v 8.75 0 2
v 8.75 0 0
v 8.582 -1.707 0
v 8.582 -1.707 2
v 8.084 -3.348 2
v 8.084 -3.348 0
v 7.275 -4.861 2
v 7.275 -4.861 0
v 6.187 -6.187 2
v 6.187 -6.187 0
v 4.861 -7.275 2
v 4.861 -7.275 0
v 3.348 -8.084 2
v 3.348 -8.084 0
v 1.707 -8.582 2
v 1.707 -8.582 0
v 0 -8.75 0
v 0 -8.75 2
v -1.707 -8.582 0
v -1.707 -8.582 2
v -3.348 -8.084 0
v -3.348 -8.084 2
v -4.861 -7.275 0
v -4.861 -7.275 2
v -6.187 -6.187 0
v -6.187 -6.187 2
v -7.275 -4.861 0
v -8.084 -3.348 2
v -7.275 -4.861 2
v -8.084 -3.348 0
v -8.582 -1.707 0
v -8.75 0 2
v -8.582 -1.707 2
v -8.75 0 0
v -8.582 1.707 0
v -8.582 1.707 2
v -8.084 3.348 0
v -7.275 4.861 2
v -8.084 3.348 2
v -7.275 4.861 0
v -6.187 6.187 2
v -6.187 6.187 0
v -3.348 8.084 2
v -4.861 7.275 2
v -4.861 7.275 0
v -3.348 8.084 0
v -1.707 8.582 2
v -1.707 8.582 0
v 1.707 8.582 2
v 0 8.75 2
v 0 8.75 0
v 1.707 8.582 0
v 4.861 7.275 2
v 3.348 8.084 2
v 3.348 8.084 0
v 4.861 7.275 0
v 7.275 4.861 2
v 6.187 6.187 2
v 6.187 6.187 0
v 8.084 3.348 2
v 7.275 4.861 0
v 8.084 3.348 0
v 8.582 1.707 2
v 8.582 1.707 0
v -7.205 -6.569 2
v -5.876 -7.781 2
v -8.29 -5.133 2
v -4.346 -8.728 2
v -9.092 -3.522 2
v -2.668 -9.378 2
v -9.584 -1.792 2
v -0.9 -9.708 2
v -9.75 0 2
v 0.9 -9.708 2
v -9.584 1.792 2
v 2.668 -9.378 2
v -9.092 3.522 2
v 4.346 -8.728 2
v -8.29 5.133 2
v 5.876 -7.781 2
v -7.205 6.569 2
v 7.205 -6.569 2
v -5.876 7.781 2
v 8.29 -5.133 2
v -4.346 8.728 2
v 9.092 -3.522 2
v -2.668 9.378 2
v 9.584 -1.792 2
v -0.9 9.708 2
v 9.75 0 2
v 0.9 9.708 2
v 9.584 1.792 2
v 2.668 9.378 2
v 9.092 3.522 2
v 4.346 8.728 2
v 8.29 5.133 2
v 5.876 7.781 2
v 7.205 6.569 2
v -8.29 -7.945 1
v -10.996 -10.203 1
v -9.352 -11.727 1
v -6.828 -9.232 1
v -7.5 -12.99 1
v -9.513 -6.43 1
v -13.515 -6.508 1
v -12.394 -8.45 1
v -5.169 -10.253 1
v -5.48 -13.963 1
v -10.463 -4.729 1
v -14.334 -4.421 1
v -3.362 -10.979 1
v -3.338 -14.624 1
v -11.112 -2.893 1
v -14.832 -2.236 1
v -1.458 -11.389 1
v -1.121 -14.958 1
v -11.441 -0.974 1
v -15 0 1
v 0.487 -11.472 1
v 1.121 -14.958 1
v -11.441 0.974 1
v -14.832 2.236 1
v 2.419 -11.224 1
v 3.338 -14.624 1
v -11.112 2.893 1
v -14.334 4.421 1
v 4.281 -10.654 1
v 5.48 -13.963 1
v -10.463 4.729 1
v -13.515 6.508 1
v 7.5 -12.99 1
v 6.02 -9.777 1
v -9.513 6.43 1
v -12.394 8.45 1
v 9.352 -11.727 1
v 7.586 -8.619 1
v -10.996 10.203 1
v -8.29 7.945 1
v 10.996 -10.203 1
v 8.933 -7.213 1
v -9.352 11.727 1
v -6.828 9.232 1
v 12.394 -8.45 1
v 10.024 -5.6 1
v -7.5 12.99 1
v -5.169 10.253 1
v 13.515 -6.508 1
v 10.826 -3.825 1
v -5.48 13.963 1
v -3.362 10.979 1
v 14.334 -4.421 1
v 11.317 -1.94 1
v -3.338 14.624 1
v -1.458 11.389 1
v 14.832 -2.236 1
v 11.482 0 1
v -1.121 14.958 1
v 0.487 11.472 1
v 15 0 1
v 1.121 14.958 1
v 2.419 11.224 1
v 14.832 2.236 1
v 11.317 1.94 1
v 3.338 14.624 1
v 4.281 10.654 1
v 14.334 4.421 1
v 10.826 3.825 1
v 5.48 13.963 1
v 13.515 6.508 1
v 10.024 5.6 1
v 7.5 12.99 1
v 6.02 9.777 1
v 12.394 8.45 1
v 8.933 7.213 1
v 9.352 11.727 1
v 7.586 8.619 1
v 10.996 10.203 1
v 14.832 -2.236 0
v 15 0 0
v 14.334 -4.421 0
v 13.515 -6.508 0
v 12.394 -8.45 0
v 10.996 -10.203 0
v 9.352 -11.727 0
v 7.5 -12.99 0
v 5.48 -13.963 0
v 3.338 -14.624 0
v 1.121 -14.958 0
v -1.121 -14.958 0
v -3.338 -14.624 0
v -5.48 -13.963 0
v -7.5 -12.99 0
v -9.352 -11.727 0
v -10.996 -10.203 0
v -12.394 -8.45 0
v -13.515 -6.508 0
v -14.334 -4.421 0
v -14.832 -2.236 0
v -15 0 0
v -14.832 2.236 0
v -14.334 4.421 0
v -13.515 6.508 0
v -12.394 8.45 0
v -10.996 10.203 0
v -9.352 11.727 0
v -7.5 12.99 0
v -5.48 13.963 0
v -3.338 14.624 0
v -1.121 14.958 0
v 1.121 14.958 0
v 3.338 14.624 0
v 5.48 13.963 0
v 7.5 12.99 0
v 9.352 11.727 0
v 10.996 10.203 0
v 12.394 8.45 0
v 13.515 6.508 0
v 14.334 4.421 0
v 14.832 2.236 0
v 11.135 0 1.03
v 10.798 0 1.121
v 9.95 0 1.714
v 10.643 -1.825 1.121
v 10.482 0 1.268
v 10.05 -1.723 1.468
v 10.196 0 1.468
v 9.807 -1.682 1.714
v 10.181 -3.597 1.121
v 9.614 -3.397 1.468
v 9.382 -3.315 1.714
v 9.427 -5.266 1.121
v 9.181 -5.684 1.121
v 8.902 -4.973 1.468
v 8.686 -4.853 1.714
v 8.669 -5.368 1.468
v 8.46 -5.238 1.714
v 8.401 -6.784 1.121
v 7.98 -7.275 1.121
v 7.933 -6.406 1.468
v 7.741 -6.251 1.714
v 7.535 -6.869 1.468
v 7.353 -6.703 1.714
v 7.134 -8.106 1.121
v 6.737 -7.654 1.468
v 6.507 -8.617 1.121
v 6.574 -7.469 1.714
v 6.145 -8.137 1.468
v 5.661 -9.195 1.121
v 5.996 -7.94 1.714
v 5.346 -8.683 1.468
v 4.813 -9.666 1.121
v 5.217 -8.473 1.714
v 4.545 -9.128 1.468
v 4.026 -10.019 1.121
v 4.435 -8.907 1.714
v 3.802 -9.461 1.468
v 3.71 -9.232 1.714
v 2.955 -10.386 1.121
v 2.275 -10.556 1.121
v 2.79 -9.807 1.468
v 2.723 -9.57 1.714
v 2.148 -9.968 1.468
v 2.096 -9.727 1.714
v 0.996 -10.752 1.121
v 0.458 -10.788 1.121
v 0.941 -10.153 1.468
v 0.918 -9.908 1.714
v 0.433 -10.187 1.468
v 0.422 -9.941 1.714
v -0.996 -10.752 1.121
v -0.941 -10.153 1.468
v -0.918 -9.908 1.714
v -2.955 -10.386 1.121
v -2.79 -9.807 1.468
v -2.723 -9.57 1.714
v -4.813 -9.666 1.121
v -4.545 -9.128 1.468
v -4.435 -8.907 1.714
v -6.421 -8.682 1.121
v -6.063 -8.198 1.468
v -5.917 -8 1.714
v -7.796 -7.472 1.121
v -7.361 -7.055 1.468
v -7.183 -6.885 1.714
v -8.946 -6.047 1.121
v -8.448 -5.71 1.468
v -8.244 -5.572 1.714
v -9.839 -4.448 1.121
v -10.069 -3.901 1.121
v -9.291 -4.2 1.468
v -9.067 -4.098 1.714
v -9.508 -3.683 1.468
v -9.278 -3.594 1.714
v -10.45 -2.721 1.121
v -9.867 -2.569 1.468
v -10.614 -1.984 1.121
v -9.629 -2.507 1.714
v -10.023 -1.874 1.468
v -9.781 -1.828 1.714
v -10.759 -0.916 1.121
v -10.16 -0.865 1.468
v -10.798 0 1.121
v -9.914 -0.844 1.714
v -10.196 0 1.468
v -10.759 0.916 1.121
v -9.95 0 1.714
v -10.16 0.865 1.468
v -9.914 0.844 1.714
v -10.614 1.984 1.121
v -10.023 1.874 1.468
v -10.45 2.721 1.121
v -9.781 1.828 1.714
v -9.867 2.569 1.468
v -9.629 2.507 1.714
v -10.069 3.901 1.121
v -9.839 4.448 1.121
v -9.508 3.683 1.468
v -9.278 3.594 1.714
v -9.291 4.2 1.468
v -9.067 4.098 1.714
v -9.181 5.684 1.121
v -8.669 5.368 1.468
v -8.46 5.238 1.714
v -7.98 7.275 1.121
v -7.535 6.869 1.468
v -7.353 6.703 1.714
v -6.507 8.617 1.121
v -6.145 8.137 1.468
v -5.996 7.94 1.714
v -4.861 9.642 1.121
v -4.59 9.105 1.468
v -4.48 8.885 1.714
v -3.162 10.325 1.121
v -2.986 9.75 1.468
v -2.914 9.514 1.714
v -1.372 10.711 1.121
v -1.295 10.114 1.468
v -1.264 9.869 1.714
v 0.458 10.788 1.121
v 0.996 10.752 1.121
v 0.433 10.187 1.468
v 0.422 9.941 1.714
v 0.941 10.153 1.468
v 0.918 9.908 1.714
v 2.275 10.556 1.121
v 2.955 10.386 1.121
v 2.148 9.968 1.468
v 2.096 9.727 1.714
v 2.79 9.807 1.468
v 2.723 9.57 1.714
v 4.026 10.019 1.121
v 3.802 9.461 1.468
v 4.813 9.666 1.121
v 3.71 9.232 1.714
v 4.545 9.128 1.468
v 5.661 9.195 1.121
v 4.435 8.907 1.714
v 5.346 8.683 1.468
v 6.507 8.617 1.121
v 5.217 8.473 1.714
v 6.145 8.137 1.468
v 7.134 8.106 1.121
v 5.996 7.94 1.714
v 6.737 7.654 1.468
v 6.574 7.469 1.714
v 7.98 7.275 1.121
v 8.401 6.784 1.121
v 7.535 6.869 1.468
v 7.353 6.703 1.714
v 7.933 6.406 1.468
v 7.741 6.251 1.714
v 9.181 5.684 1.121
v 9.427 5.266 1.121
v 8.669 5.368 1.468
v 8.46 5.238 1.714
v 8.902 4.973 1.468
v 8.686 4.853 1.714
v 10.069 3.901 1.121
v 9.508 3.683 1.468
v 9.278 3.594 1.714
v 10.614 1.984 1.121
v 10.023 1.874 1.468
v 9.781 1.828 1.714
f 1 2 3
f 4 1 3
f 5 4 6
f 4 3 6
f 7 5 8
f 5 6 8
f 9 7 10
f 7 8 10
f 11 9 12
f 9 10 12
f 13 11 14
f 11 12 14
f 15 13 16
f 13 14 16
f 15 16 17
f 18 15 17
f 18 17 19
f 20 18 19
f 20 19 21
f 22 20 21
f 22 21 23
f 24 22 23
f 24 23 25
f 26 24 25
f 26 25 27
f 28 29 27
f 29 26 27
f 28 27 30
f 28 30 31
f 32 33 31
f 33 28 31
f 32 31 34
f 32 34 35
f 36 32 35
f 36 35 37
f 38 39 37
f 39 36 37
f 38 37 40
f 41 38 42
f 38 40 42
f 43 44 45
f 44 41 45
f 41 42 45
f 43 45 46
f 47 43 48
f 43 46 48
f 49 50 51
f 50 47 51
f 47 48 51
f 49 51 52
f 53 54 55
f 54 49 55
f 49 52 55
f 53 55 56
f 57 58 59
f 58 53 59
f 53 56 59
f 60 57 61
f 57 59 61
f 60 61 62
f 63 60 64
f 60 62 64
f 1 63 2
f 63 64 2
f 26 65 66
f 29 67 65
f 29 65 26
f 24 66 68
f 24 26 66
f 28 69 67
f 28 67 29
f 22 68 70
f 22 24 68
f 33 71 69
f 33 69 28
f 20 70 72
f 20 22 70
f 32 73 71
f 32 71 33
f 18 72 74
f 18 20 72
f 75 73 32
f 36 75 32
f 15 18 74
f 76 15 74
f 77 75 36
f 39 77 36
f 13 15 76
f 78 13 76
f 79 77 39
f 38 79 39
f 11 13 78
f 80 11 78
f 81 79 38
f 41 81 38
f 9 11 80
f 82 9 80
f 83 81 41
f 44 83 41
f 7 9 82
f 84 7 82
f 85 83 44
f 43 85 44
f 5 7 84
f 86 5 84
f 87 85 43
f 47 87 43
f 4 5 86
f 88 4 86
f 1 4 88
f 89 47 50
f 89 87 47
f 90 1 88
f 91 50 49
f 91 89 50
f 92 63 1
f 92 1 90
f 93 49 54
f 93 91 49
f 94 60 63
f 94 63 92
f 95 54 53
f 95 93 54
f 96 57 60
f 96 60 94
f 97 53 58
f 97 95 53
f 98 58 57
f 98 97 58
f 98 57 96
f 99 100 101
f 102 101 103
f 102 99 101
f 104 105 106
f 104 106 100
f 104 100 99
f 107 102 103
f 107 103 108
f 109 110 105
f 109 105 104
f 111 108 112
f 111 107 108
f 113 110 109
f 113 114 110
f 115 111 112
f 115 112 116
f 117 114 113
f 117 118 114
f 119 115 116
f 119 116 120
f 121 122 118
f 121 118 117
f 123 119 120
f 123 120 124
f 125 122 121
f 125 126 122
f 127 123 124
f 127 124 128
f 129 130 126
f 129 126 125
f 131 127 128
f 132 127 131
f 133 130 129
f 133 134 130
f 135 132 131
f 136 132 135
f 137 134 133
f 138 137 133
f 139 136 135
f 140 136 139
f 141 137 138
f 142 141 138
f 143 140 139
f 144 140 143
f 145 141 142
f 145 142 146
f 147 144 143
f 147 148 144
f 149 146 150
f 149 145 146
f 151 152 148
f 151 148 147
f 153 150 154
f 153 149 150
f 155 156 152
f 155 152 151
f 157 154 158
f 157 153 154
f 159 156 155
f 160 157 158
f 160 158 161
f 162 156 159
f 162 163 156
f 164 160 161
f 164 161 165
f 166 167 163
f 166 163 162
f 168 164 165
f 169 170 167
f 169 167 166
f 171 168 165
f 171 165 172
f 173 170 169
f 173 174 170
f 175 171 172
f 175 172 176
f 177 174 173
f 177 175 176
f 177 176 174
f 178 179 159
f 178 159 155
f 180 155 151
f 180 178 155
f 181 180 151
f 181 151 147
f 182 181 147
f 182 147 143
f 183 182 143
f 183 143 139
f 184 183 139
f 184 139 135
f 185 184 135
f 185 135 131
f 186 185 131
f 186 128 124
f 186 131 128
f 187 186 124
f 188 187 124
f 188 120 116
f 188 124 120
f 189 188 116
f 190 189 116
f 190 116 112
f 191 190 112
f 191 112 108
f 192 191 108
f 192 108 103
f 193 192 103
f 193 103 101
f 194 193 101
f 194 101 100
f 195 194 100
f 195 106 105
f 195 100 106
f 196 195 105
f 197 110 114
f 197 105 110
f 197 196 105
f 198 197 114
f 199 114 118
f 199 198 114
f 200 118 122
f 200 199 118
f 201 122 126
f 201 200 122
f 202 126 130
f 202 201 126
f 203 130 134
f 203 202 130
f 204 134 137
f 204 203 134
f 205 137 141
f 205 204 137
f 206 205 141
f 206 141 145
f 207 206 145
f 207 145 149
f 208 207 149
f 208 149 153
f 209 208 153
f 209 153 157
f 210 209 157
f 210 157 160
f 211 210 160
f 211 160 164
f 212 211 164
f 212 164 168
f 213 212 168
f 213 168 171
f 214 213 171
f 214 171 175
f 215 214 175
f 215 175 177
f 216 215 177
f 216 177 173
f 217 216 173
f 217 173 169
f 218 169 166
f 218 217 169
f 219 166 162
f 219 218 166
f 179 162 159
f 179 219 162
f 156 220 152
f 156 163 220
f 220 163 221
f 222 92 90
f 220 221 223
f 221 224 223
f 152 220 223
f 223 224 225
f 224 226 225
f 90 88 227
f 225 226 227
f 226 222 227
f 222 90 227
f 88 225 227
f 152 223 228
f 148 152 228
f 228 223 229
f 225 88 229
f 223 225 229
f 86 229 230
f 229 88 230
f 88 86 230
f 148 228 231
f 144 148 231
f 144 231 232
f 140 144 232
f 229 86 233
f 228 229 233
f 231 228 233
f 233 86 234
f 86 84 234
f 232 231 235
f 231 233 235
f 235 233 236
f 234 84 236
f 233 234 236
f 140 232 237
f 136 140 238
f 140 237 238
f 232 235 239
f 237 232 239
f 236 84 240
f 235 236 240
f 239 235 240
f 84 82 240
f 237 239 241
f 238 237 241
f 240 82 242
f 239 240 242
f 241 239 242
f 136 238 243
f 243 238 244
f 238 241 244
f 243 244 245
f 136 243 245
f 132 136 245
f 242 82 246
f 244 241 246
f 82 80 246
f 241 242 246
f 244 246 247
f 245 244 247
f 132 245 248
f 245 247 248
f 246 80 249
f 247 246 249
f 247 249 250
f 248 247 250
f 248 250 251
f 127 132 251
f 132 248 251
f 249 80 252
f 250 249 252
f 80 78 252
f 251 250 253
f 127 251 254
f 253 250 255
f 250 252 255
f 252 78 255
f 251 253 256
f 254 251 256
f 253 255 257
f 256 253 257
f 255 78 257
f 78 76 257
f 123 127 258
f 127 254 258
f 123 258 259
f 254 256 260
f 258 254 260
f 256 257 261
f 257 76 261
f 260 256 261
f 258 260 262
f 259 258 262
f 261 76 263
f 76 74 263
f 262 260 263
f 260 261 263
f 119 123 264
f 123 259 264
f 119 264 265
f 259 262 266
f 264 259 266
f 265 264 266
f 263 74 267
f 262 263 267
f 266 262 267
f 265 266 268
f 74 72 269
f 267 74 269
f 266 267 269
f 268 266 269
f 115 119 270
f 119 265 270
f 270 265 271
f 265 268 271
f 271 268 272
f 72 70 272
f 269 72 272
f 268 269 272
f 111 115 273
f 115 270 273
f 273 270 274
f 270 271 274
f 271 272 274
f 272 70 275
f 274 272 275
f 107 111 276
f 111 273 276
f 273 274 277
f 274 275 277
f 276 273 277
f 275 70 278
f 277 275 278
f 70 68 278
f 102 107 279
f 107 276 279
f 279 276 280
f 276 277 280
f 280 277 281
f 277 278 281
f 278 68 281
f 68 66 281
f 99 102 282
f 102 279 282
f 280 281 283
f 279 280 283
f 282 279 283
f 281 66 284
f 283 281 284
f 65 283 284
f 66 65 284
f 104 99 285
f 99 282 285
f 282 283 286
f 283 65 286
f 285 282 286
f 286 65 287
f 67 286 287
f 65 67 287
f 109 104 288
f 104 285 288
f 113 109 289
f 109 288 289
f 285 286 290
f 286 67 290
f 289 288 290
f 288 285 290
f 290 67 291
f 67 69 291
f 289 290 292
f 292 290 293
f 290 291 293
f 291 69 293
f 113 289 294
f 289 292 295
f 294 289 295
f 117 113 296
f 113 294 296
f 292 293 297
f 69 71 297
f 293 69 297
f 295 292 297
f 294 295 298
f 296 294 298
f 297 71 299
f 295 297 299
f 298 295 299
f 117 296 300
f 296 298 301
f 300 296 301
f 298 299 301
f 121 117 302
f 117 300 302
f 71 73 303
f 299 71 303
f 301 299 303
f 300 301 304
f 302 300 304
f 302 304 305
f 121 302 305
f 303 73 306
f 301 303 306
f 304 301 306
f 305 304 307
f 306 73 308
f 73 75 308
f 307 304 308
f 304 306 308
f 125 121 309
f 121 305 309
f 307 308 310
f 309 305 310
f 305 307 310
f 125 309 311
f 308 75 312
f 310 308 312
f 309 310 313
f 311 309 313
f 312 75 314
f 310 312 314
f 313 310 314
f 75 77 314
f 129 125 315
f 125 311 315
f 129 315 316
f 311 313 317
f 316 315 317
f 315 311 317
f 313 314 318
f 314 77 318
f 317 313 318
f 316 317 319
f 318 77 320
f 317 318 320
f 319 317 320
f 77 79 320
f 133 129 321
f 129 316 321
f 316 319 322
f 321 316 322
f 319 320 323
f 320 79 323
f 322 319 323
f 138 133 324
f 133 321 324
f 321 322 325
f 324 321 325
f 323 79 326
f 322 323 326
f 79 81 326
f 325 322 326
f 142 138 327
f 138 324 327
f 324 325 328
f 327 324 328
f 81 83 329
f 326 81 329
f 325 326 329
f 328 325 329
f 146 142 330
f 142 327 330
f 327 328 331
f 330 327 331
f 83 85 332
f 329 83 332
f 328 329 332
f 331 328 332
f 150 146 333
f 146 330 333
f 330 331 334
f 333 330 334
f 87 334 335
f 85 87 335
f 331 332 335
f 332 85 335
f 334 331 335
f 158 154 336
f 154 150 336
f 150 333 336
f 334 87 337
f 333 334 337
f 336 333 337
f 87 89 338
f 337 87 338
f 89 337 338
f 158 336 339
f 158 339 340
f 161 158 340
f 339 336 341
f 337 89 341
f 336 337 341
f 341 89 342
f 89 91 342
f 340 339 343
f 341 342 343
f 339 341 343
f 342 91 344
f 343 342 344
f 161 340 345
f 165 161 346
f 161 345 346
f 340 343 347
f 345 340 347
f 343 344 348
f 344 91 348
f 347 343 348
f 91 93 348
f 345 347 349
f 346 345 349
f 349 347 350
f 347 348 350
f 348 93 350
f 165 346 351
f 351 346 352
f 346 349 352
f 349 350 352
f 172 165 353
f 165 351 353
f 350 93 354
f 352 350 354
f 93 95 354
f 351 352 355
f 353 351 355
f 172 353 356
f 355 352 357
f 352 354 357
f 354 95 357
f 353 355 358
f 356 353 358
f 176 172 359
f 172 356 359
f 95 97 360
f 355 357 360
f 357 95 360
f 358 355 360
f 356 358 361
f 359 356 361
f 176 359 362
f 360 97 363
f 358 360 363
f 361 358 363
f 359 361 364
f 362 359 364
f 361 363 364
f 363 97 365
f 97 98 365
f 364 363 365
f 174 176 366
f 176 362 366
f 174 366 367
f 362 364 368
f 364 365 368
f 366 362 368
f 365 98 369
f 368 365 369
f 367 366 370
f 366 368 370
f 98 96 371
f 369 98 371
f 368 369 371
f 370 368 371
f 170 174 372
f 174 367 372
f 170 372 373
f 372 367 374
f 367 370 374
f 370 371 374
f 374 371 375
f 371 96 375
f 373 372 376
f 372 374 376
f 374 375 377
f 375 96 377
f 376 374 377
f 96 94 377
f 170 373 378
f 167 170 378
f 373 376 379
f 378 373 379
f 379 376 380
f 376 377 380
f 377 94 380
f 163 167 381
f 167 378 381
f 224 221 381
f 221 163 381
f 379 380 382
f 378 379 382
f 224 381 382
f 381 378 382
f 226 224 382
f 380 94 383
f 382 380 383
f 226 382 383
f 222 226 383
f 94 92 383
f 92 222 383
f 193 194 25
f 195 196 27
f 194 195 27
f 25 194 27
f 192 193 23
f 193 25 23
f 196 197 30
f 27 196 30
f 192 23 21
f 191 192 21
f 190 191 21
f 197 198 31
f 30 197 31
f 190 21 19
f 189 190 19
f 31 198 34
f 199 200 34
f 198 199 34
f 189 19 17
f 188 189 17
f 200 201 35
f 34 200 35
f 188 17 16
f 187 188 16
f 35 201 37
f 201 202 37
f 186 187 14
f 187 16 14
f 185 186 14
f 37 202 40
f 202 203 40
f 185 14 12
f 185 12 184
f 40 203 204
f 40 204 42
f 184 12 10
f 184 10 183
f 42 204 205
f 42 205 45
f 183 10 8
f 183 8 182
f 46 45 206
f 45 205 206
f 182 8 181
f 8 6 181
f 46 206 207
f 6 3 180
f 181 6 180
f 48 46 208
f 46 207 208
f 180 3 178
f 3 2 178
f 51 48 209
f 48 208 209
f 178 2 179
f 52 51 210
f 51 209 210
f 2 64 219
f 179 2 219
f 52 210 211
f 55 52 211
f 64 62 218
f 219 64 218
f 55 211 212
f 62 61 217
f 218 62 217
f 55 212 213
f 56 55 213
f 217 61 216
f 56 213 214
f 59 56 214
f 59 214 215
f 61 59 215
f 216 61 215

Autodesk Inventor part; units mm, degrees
ref_plane "YZ Plane" through (0, 0, 0) normal (1, 0, 0) x (0, 1, 0)
ref_plane "XZ Plane" through (0, 0, 0) normal (0, 1, 0) x (-1, 0, 0)
ref_plane "XY Plane" through (0, 0, 0) normal (0, 0, 1) x (1, 0, 0)
sketch "Sketch1" plane through (0, 0, 0) normal (0, 0, 1) x (1, 0, 0)
  circle A0 centre (0, 0) radius 8.75
  circle A1 centre (0, 0) radius 15
  circle A2 centre (0, 0) radius 9.75
  dimension "d0" = 17.5
  dimension "d1" = 30
  dimension "d2" = 1
extrude "Extrusion1" add sketch "Sketch1" along normal blind 1 contours A1
extrude "Extrusion2" add sketch "Sketch1" along normal blind 2 contours A2
fillet "Fillet1" radius 2 1 edges at (-9.75, 0, 1)
properties part number "Retenedor"
